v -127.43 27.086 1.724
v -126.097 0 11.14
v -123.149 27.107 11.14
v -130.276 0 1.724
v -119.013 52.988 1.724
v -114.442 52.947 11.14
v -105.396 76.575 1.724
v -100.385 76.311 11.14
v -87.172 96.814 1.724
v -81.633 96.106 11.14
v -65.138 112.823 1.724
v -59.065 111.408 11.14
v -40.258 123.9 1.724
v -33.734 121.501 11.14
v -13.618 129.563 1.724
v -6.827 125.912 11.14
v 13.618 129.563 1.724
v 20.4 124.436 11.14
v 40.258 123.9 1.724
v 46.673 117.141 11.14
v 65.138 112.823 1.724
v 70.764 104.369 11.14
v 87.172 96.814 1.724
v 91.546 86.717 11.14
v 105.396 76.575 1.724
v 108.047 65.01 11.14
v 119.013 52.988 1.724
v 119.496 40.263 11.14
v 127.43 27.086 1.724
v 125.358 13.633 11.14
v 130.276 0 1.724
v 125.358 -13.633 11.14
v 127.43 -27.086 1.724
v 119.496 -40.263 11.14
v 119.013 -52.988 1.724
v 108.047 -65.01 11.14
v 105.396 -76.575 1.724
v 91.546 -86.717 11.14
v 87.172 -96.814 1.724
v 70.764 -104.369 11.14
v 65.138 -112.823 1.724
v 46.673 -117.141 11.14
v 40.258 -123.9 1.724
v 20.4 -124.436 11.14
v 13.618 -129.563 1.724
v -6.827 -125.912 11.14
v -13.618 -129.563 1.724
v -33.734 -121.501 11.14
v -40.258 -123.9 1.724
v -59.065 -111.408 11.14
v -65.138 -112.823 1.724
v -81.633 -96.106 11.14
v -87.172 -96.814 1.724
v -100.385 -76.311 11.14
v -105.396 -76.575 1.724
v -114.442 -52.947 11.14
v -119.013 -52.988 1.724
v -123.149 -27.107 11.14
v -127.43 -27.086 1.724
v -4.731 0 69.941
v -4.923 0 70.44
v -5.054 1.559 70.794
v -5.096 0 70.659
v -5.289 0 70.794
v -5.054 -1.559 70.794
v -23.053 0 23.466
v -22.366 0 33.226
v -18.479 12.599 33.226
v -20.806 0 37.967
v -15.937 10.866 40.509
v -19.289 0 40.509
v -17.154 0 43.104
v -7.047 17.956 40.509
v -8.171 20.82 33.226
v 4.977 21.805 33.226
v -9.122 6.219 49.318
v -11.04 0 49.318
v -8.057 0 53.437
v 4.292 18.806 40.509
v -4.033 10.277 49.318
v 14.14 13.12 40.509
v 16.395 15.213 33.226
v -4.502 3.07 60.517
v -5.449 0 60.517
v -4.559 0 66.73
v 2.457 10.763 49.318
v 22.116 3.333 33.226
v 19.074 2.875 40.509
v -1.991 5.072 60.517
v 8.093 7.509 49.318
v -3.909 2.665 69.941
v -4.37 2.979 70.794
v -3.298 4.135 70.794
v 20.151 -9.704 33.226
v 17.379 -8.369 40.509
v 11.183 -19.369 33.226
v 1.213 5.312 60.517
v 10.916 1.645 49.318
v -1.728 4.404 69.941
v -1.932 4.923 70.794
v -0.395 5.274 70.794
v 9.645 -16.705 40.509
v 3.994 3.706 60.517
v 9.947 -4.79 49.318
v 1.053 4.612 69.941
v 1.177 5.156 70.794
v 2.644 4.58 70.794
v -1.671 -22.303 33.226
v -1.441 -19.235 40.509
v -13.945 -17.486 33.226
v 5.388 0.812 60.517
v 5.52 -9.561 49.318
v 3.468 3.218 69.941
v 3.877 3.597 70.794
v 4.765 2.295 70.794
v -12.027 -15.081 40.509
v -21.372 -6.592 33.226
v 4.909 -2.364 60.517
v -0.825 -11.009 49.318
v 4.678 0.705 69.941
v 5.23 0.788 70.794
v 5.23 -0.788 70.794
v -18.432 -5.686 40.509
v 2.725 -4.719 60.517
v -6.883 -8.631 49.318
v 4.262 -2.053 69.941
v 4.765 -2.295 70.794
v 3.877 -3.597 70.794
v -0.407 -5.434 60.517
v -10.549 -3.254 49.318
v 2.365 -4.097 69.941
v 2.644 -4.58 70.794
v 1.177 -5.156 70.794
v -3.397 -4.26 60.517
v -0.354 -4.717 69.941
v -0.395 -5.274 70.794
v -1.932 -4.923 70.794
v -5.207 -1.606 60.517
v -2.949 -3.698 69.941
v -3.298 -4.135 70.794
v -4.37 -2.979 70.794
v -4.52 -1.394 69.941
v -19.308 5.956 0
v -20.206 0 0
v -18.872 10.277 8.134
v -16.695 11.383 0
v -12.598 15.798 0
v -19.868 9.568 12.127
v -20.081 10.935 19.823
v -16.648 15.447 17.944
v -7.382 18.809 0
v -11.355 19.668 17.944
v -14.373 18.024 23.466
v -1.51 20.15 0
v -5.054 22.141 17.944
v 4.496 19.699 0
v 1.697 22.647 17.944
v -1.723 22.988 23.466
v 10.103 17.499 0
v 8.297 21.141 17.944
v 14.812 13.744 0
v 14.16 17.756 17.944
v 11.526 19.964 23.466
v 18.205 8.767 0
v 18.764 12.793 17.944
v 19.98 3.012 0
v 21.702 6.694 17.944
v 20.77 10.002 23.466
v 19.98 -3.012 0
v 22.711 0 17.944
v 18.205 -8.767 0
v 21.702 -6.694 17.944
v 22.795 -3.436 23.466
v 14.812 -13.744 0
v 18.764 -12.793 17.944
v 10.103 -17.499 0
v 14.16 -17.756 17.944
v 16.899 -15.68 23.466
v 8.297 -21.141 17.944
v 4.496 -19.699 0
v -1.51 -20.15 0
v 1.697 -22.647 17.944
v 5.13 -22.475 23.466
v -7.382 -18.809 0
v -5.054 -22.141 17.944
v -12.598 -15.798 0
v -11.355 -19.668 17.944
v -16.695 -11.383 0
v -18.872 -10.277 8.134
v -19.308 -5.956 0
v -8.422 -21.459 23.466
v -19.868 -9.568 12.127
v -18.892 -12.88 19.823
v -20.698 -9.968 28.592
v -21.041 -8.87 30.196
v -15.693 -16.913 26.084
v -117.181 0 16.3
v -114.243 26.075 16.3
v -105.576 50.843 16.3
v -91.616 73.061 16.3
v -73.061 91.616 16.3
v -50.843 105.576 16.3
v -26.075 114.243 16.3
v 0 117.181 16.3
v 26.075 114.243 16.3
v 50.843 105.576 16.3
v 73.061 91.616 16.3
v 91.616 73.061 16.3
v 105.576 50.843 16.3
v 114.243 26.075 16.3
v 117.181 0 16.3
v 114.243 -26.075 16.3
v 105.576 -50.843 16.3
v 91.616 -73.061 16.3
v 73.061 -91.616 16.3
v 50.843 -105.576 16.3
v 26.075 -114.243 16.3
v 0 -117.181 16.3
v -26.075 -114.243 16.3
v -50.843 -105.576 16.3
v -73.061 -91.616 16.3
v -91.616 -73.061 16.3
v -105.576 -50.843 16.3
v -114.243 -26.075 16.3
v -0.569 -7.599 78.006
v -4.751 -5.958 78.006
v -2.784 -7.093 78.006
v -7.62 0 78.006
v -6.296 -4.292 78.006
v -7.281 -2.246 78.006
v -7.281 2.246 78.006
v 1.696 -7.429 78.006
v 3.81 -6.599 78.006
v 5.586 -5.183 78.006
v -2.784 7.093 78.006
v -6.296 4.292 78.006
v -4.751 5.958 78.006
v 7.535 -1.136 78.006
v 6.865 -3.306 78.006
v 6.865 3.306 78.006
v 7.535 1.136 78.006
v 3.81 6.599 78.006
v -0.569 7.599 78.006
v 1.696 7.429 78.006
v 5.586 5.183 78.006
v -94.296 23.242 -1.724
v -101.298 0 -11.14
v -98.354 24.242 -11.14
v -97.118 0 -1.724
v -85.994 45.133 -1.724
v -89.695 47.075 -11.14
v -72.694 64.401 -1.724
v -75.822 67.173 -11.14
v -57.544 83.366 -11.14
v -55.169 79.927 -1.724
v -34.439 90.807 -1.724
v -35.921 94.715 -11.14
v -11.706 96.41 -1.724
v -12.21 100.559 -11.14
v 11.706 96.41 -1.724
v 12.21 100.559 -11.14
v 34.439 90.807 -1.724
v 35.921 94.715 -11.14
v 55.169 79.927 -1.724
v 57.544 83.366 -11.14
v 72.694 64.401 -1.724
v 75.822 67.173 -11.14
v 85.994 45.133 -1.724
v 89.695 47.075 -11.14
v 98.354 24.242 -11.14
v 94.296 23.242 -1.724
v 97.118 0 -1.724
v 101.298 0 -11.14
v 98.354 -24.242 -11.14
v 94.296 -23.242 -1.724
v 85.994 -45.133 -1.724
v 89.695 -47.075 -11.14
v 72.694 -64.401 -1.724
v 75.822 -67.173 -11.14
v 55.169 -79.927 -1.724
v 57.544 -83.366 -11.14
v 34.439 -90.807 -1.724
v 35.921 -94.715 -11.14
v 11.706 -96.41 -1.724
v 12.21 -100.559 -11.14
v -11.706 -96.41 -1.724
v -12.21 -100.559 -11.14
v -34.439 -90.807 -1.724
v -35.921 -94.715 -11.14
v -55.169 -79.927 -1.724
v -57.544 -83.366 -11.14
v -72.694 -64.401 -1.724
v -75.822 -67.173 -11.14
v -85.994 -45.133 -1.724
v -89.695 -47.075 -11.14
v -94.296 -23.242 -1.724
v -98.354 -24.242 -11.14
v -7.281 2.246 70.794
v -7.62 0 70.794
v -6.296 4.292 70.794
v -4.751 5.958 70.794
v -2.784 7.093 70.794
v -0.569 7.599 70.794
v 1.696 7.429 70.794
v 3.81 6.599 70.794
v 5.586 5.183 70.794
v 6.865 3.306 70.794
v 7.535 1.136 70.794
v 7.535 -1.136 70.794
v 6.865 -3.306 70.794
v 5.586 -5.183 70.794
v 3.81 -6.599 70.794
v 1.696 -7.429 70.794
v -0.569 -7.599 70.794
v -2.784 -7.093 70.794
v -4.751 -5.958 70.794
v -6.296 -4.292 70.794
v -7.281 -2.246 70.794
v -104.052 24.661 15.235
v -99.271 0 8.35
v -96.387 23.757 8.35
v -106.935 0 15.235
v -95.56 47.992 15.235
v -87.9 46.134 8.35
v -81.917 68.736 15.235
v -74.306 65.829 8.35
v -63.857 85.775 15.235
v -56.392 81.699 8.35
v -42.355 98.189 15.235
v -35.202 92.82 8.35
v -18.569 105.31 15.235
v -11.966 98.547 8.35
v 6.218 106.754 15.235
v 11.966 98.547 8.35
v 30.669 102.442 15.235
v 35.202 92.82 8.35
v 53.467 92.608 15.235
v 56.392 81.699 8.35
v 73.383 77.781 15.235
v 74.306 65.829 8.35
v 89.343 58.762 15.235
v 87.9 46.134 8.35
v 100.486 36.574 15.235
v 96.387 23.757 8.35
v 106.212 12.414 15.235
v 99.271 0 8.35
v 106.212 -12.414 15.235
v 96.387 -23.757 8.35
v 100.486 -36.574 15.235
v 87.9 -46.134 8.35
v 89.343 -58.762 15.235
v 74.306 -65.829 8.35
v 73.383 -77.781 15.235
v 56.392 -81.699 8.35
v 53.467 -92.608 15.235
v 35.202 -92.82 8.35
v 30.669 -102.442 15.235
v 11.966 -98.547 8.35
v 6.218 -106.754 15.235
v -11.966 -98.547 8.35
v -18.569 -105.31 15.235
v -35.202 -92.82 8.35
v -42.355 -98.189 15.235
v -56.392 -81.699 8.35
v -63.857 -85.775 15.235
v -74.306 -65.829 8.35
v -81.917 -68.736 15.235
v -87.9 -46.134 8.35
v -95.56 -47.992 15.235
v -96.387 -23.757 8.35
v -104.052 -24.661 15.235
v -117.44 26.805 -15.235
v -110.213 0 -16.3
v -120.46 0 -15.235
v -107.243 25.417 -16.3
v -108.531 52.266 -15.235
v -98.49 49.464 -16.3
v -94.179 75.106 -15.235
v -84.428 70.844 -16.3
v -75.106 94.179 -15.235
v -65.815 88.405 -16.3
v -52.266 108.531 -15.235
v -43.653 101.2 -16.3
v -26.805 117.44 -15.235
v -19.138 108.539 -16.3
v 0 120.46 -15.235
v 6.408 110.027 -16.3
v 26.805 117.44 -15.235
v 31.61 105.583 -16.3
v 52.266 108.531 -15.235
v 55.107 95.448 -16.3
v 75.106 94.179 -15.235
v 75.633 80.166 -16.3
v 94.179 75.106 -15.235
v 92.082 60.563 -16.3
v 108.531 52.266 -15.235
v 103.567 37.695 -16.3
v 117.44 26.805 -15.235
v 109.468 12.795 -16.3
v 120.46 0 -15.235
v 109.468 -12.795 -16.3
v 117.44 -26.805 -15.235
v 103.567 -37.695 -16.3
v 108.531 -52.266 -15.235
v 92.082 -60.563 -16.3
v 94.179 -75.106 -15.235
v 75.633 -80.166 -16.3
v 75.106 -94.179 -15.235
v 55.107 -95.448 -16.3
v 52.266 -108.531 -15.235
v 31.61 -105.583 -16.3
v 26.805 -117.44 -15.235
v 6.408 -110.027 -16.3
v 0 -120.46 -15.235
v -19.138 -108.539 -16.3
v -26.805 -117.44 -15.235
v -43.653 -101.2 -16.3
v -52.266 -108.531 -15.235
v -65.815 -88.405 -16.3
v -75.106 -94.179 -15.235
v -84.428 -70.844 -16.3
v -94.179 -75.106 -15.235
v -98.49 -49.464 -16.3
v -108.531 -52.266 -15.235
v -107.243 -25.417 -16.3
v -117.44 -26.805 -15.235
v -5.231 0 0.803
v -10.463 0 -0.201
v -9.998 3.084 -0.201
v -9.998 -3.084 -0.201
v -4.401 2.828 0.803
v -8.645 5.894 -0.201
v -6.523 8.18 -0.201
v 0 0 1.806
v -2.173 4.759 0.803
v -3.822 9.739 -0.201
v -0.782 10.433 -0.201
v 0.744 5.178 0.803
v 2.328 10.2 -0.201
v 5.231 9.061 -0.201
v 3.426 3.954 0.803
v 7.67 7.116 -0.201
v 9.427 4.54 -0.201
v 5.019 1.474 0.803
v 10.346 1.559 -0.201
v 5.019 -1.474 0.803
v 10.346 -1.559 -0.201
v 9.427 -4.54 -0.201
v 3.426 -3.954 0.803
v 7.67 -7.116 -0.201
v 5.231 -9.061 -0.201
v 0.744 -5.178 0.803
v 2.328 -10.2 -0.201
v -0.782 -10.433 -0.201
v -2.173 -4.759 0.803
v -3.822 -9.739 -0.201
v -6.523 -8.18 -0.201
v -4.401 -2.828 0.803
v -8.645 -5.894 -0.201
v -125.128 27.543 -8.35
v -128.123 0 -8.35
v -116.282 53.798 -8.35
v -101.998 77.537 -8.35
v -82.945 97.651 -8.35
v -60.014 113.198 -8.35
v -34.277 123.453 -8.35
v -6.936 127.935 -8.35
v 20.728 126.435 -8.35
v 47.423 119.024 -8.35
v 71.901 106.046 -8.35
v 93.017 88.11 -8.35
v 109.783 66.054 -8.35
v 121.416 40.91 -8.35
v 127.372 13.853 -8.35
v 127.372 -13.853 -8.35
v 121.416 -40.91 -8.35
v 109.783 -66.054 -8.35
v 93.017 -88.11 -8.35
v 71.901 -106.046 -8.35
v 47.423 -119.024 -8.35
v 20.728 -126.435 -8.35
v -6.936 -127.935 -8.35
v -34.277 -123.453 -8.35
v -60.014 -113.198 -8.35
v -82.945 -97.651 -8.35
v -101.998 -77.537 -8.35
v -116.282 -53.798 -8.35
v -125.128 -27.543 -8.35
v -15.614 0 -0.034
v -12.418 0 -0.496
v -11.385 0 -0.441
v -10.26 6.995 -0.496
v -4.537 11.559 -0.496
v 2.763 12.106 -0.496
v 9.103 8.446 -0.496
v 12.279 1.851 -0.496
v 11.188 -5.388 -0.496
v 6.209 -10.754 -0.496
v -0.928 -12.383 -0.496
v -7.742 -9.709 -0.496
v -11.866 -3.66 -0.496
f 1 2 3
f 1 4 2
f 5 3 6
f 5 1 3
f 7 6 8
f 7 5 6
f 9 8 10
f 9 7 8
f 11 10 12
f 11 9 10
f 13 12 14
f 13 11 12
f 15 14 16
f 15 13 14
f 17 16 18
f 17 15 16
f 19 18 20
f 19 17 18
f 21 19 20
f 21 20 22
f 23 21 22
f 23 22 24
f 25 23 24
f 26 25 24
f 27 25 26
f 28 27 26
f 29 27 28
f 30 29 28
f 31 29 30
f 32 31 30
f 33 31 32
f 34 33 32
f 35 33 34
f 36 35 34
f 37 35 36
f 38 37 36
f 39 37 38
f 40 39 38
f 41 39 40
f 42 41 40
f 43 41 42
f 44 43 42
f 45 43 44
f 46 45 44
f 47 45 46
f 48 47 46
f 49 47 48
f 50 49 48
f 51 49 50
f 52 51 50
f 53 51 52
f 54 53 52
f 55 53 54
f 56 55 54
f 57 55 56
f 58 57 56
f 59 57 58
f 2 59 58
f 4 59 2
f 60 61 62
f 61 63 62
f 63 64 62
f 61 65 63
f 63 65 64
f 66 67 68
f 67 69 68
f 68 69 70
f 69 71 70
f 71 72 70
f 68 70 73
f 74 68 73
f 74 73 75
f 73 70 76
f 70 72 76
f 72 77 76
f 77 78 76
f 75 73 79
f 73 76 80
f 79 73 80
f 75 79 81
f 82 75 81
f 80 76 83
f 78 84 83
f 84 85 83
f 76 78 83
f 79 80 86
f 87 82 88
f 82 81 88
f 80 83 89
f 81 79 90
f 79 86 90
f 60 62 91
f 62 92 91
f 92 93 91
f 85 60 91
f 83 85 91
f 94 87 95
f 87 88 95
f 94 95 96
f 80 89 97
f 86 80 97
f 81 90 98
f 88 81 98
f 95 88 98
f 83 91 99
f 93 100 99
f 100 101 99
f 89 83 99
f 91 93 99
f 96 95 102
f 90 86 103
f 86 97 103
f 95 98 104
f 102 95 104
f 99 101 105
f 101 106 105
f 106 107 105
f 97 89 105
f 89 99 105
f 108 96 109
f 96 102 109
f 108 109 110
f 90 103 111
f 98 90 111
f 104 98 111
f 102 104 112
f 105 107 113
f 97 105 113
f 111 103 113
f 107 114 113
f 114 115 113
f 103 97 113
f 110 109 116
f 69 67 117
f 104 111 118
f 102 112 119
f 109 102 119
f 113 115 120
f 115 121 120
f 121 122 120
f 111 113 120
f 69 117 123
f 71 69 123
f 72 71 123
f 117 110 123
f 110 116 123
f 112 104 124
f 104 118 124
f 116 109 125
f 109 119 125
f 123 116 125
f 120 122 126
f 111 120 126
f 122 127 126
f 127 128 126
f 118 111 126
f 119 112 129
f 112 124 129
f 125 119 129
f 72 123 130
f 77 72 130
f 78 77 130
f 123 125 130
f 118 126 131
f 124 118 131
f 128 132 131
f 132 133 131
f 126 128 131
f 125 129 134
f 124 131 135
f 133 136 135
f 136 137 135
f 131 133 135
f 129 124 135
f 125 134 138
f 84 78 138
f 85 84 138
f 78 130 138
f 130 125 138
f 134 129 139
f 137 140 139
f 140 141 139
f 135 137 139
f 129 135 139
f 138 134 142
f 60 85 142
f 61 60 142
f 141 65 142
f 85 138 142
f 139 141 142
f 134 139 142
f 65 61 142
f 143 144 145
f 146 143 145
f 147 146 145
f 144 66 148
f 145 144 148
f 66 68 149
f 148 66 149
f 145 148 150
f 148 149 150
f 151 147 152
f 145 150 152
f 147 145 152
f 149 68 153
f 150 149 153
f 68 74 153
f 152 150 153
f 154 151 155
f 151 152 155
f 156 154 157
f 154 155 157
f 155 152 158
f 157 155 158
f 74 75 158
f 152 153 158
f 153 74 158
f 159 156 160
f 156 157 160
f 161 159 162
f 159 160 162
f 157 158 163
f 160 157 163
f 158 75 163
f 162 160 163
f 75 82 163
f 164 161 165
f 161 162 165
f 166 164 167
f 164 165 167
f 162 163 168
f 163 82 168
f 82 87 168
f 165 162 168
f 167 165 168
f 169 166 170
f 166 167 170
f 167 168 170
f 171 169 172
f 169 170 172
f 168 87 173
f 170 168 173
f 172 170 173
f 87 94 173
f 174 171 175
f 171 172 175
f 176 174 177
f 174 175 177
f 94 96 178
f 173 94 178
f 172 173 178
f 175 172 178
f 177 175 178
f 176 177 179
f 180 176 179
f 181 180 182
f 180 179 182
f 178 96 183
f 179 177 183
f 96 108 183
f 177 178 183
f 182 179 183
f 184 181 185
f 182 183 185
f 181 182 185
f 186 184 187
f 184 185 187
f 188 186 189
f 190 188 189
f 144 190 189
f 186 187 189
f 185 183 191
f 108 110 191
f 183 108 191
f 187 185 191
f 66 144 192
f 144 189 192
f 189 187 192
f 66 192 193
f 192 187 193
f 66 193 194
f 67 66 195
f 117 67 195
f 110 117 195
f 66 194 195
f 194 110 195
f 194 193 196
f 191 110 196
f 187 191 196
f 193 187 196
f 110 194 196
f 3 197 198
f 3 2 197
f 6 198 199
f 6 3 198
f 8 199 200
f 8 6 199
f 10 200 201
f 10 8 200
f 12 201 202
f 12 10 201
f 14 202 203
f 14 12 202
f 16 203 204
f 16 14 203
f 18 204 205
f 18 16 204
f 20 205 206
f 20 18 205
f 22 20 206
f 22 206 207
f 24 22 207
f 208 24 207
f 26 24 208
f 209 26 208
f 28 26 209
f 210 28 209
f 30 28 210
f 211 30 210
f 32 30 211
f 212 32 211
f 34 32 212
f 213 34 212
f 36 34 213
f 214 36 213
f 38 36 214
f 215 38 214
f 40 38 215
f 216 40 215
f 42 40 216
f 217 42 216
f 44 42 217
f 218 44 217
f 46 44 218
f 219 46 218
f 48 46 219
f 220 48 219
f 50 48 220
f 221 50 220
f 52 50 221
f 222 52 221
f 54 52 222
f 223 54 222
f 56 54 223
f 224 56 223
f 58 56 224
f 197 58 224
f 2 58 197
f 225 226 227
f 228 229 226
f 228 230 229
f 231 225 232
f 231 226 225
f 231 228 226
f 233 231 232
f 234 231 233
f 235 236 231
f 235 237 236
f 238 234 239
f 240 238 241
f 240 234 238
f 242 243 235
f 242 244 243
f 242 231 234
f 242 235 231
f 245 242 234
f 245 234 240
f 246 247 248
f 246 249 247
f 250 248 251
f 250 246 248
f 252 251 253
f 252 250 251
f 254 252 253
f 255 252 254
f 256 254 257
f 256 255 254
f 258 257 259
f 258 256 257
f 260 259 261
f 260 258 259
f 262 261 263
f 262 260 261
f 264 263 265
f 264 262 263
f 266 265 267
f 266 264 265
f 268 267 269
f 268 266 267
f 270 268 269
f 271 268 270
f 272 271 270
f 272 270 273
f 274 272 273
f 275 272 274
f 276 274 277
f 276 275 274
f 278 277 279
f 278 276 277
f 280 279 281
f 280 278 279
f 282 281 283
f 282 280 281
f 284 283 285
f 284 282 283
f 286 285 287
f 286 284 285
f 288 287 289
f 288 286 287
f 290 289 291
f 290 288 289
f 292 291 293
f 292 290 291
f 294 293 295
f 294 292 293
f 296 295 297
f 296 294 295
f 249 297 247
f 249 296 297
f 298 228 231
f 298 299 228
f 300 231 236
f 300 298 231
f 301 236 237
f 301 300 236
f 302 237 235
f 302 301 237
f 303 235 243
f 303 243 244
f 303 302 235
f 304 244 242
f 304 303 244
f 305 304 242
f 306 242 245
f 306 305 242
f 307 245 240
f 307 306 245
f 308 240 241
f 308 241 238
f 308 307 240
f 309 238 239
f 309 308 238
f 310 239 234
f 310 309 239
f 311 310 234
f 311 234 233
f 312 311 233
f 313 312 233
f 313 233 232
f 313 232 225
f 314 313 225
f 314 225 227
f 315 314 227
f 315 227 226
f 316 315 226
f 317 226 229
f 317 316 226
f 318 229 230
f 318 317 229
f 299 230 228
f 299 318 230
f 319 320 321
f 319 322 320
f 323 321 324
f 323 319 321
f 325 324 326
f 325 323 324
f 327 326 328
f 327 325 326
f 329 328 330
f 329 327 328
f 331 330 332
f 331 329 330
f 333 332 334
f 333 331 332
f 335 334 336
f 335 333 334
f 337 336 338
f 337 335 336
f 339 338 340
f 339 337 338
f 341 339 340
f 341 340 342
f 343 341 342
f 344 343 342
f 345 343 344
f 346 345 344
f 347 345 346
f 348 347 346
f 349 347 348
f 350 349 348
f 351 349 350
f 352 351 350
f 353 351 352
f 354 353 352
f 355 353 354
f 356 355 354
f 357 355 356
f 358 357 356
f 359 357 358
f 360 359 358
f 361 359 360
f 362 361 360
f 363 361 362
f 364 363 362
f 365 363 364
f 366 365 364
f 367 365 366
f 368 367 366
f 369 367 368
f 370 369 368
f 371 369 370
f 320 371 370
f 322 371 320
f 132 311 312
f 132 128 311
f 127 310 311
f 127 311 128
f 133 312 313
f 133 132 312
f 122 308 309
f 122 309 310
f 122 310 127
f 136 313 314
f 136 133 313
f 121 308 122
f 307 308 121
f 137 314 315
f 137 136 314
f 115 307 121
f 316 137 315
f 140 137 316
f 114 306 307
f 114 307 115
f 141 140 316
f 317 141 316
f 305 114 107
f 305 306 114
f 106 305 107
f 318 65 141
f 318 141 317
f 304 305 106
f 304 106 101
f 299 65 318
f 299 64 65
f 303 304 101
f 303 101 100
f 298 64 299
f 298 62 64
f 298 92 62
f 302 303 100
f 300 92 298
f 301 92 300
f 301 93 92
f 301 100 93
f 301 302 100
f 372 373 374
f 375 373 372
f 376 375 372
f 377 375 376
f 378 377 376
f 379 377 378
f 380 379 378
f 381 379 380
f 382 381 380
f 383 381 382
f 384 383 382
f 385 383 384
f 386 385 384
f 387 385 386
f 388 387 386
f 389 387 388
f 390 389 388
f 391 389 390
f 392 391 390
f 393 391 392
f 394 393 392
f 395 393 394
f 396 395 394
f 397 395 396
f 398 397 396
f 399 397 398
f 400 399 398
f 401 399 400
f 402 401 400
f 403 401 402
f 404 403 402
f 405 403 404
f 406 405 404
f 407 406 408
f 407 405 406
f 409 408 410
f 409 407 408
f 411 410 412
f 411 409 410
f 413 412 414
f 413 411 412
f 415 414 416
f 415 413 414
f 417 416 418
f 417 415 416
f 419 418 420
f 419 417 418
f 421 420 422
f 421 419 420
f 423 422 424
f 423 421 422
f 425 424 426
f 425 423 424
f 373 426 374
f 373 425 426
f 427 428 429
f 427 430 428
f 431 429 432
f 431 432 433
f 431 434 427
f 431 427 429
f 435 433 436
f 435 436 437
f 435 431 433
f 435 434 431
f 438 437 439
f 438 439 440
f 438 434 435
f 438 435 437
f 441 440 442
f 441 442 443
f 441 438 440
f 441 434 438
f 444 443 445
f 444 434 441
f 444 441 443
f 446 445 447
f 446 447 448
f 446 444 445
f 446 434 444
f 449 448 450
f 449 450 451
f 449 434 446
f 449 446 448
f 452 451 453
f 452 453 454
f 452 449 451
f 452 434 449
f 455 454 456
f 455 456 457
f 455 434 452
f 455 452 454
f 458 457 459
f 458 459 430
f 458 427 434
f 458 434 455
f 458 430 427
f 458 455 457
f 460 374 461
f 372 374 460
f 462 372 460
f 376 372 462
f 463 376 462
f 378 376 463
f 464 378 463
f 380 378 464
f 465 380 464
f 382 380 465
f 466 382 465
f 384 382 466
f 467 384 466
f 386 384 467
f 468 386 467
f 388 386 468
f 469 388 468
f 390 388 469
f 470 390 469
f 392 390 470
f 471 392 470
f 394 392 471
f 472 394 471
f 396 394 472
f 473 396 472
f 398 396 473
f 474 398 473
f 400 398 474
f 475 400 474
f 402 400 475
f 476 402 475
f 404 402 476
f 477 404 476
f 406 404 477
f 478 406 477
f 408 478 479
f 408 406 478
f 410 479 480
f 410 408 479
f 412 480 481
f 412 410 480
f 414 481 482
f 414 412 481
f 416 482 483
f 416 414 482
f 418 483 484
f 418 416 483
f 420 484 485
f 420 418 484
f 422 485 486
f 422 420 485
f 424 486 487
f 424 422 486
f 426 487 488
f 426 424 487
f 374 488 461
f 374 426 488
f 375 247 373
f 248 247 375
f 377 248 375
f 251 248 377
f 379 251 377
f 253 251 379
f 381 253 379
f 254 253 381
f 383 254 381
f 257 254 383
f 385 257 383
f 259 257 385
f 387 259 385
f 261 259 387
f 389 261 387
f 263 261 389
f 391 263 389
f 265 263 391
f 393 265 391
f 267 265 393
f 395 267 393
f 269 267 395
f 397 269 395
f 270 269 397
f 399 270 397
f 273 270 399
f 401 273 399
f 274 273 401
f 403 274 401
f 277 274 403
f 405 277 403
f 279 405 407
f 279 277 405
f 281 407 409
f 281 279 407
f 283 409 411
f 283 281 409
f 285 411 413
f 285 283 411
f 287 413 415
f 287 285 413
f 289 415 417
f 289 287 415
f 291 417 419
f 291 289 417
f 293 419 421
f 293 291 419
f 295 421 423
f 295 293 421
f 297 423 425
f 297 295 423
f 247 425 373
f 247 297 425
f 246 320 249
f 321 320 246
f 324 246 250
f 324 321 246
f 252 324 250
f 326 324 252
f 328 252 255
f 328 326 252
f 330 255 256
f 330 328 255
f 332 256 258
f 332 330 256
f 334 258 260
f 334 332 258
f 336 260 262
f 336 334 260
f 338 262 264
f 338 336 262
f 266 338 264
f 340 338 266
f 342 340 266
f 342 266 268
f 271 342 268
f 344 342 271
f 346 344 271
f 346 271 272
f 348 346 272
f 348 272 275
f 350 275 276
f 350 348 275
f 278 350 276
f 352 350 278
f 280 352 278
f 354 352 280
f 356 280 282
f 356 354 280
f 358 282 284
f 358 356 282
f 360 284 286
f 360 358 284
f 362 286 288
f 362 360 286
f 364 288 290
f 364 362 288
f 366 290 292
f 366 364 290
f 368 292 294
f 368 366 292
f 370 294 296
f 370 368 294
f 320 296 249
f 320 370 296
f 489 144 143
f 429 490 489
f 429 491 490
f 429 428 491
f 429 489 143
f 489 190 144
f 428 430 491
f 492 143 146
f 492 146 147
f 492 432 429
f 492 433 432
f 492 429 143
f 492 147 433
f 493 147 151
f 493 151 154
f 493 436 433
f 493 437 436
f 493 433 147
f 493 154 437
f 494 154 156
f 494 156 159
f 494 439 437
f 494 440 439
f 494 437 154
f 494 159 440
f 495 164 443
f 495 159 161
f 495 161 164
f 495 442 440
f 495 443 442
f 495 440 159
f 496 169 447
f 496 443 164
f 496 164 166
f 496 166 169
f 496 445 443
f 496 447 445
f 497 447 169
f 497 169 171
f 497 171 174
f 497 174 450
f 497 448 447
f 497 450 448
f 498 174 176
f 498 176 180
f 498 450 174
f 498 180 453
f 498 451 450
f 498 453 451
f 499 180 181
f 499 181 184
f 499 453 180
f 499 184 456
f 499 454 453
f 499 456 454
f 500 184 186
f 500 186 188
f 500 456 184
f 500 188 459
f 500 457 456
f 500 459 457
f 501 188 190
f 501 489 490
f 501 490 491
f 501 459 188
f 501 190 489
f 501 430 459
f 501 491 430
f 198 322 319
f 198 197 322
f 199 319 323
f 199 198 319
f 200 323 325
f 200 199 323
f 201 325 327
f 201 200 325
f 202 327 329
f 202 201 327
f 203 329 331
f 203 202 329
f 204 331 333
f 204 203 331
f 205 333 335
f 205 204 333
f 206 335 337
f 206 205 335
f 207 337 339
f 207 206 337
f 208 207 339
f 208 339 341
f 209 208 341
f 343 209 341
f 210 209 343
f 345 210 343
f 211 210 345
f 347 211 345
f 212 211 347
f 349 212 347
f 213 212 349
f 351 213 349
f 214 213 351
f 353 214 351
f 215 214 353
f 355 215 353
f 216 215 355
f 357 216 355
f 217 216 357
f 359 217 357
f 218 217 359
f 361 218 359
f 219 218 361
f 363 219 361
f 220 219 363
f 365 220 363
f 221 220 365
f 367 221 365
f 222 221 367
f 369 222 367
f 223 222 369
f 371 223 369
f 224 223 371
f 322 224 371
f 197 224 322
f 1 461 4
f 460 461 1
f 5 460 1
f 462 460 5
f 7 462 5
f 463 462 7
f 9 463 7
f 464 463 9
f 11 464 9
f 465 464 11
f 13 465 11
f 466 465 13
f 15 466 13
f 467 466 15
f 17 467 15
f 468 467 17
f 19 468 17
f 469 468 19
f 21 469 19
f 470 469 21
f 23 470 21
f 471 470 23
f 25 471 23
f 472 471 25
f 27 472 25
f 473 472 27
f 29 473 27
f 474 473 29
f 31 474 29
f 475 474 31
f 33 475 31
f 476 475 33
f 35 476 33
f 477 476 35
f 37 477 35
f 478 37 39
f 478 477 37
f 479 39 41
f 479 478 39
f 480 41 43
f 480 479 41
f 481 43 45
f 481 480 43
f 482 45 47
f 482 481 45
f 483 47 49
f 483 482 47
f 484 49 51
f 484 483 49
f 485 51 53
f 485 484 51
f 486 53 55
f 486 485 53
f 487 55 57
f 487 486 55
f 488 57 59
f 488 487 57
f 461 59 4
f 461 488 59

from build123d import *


with BuildPart() as f2:
    # F1 (on Front) → F2 (revolve)
    with BuildSketch(Plane.XZ):
        with BuildLine():
            add(Edge.make_bspline(
                [(-20.2061062144, 0), (-22.5734689299, 14.6112508726), (-26.6820375906, 39.9691426034), (-5.5523124358, 50.0009591615), (-3.9387598042, 69.6262983032), (-5.1045268818, 70.6953924398), (-5.2887980974, 70.7940426392)],
                knots=[0, 0, 0, 0, 0.3896957001, 0.6763186435, 0.9361015718, 0.9808657513, 0.9808657513, 0.9808657513, 0.9808657513], degree=3))
            add(Edge.make_bspline(
                [(-20.2061062144, 0), (-18.7857794121, -0.1142634705), (-15.8763879892, 0.4646922615), (-12.2980860209, -0.8998767802), (-10.4626503224, -0.2007785334)],
                knots=[0, 0, 0, 0, 0.4709395779, 1, 1, 1, 1], degree=3))
            Line((-10.4626503224, -0.2007785334), (0, 1.8057984016))
            Line((0, 1.8057984016), (0, 78.0057984016))
            Line((0, 78.0057984016), (-7.62, 78.0057984016))
            Line((-7.62, 78.0057984016), (-7.62, 70.7940426392))
            Line((-7.62, 70.7940426392), (-5.2887980974, 70.7940426392))
        make_face()
    revolve(axis=Axis((0, 0, 39.9057984016), (0, 0, -1)))


with BuildPart() as f3:
    # F0 (on Front) → F3 (revolve)
    with BuildSketch(Plane.XZ):
        Polygon((-110.2134334981, -16.3003819282), (-101.2976568997, -11.13955693), (-97.1180989371, -1.7237998042), (-99.2712086941, 8.350390257), (-106.934571425, 15.2350150594), (-117.1810430348, 16.3003819282), (-126.0968196332, 11.13955693), (-130.2763775958, 1.7237998042), (-128.1232678388, -8.350390257), (-120.4599051079, -15.2350150594), align=None)
    revolve(axis=Axis((0, 0, -0.4838183522), (0, 0, -1)))


solid = Compound([f2.part, f3.part])
